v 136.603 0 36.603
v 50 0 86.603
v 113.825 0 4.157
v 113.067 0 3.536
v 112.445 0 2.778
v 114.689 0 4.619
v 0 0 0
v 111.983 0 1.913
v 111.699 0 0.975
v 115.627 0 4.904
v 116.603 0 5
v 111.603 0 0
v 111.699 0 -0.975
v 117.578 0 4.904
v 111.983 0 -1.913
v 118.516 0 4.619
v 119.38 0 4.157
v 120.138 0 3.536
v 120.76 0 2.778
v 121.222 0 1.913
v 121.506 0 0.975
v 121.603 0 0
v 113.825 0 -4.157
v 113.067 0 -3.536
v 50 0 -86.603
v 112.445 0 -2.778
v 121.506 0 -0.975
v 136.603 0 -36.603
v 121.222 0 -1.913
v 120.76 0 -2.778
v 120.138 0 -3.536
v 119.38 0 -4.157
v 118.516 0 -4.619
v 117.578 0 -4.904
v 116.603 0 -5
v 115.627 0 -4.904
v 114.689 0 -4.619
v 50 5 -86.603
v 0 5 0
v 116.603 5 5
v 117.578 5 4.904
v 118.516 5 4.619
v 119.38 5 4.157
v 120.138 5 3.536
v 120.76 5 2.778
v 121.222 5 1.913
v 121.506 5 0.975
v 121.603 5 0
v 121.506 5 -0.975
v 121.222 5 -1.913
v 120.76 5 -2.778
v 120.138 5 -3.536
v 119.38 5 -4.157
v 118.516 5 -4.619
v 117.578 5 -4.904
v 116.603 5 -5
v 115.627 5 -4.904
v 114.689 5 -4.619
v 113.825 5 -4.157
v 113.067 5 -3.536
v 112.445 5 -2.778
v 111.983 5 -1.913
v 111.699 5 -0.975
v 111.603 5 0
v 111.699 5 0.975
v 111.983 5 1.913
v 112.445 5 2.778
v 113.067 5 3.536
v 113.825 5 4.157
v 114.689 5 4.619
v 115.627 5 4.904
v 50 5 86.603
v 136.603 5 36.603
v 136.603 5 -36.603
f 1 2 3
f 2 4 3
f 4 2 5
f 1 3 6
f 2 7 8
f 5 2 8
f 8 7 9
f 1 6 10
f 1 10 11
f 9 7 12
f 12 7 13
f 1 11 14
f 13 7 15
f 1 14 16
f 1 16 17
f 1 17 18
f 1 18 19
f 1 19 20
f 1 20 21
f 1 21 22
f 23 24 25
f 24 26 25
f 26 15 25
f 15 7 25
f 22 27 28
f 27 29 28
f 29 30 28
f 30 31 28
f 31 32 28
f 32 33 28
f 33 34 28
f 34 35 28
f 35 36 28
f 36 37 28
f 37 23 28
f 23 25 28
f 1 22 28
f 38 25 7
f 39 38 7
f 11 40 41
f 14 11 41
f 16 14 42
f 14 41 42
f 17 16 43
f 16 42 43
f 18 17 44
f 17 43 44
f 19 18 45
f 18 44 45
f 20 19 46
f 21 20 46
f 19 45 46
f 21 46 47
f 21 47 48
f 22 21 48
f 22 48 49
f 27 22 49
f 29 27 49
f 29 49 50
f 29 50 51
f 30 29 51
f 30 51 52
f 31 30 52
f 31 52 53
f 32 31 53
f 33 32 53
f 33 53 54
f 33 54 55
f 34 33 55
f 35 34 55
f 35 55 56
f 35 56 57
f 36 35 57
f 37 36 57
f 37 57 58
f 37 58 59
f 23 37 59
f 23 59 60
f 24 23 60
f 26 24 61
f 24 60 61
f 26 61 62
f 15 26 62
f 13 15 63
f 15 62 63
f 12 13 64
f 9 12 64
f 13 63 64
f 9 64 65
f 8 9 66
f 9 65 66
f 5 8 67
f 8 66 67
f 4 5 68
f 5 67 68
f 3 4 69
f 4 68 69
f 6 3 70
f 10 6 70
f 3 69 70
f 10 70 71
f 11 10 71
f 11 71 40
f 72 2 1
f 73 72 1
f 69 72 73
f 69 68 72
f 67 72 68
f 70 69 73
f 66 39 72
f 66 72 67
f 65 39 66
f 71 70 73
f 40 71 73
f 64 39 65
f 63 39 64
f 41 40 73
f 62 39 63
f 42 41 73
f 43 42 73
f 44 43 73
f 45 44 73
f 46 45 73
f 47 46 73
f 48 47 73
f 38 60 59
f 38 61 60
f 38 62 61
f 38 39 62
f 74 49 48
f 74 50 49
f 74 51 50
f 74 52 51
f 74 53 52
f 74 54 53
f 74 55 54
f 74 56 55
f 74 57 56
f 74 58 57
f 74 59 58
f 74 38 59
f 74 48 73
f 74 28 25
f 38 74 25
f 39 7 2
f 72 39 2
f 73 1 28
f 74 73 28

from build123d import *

# Parameters (mm, degrees)
BOSS_EXTRU_1_DEPTH      = 5
ESQUISSE2_R             = 5
ENL_V_MAT_EXTRU_1_DEPTH = 10


with BuildPart() as part:
    # Esquisse1 → Boss.-Extru.1 (new body)
    with BuildSketch(Plane(origin=(0, 0, 0), x_dir=(1, 0, 0), z_dir=(0, 1, 0))):
        Polygon((0, 0), (50, -86.602540378), (136.602540378, -36.602540378), (136.602540378, 36.602540378), (50, 86.602540378), align=None)
    extrude(amount=BOSS_EXTRU_1_DEPTH)

    # Esquisse2 → Enlèv. mat.-Extru.1 (cut)
    with BuildSketch(Plane(origin=(0, 5, 0), x_dir=(1, 0, 0), z_dir=(0, 1, 0))):
        with Locations(Location((116.602540378, 0, 0), (0, 0, 270))):
            Circle(ESQUISSE2_R)
    extrude(amount=-ENL_V_MAT_EXTRU_1_DEPTH, mode=Mode.SUBTRACT)


solid = part.part
